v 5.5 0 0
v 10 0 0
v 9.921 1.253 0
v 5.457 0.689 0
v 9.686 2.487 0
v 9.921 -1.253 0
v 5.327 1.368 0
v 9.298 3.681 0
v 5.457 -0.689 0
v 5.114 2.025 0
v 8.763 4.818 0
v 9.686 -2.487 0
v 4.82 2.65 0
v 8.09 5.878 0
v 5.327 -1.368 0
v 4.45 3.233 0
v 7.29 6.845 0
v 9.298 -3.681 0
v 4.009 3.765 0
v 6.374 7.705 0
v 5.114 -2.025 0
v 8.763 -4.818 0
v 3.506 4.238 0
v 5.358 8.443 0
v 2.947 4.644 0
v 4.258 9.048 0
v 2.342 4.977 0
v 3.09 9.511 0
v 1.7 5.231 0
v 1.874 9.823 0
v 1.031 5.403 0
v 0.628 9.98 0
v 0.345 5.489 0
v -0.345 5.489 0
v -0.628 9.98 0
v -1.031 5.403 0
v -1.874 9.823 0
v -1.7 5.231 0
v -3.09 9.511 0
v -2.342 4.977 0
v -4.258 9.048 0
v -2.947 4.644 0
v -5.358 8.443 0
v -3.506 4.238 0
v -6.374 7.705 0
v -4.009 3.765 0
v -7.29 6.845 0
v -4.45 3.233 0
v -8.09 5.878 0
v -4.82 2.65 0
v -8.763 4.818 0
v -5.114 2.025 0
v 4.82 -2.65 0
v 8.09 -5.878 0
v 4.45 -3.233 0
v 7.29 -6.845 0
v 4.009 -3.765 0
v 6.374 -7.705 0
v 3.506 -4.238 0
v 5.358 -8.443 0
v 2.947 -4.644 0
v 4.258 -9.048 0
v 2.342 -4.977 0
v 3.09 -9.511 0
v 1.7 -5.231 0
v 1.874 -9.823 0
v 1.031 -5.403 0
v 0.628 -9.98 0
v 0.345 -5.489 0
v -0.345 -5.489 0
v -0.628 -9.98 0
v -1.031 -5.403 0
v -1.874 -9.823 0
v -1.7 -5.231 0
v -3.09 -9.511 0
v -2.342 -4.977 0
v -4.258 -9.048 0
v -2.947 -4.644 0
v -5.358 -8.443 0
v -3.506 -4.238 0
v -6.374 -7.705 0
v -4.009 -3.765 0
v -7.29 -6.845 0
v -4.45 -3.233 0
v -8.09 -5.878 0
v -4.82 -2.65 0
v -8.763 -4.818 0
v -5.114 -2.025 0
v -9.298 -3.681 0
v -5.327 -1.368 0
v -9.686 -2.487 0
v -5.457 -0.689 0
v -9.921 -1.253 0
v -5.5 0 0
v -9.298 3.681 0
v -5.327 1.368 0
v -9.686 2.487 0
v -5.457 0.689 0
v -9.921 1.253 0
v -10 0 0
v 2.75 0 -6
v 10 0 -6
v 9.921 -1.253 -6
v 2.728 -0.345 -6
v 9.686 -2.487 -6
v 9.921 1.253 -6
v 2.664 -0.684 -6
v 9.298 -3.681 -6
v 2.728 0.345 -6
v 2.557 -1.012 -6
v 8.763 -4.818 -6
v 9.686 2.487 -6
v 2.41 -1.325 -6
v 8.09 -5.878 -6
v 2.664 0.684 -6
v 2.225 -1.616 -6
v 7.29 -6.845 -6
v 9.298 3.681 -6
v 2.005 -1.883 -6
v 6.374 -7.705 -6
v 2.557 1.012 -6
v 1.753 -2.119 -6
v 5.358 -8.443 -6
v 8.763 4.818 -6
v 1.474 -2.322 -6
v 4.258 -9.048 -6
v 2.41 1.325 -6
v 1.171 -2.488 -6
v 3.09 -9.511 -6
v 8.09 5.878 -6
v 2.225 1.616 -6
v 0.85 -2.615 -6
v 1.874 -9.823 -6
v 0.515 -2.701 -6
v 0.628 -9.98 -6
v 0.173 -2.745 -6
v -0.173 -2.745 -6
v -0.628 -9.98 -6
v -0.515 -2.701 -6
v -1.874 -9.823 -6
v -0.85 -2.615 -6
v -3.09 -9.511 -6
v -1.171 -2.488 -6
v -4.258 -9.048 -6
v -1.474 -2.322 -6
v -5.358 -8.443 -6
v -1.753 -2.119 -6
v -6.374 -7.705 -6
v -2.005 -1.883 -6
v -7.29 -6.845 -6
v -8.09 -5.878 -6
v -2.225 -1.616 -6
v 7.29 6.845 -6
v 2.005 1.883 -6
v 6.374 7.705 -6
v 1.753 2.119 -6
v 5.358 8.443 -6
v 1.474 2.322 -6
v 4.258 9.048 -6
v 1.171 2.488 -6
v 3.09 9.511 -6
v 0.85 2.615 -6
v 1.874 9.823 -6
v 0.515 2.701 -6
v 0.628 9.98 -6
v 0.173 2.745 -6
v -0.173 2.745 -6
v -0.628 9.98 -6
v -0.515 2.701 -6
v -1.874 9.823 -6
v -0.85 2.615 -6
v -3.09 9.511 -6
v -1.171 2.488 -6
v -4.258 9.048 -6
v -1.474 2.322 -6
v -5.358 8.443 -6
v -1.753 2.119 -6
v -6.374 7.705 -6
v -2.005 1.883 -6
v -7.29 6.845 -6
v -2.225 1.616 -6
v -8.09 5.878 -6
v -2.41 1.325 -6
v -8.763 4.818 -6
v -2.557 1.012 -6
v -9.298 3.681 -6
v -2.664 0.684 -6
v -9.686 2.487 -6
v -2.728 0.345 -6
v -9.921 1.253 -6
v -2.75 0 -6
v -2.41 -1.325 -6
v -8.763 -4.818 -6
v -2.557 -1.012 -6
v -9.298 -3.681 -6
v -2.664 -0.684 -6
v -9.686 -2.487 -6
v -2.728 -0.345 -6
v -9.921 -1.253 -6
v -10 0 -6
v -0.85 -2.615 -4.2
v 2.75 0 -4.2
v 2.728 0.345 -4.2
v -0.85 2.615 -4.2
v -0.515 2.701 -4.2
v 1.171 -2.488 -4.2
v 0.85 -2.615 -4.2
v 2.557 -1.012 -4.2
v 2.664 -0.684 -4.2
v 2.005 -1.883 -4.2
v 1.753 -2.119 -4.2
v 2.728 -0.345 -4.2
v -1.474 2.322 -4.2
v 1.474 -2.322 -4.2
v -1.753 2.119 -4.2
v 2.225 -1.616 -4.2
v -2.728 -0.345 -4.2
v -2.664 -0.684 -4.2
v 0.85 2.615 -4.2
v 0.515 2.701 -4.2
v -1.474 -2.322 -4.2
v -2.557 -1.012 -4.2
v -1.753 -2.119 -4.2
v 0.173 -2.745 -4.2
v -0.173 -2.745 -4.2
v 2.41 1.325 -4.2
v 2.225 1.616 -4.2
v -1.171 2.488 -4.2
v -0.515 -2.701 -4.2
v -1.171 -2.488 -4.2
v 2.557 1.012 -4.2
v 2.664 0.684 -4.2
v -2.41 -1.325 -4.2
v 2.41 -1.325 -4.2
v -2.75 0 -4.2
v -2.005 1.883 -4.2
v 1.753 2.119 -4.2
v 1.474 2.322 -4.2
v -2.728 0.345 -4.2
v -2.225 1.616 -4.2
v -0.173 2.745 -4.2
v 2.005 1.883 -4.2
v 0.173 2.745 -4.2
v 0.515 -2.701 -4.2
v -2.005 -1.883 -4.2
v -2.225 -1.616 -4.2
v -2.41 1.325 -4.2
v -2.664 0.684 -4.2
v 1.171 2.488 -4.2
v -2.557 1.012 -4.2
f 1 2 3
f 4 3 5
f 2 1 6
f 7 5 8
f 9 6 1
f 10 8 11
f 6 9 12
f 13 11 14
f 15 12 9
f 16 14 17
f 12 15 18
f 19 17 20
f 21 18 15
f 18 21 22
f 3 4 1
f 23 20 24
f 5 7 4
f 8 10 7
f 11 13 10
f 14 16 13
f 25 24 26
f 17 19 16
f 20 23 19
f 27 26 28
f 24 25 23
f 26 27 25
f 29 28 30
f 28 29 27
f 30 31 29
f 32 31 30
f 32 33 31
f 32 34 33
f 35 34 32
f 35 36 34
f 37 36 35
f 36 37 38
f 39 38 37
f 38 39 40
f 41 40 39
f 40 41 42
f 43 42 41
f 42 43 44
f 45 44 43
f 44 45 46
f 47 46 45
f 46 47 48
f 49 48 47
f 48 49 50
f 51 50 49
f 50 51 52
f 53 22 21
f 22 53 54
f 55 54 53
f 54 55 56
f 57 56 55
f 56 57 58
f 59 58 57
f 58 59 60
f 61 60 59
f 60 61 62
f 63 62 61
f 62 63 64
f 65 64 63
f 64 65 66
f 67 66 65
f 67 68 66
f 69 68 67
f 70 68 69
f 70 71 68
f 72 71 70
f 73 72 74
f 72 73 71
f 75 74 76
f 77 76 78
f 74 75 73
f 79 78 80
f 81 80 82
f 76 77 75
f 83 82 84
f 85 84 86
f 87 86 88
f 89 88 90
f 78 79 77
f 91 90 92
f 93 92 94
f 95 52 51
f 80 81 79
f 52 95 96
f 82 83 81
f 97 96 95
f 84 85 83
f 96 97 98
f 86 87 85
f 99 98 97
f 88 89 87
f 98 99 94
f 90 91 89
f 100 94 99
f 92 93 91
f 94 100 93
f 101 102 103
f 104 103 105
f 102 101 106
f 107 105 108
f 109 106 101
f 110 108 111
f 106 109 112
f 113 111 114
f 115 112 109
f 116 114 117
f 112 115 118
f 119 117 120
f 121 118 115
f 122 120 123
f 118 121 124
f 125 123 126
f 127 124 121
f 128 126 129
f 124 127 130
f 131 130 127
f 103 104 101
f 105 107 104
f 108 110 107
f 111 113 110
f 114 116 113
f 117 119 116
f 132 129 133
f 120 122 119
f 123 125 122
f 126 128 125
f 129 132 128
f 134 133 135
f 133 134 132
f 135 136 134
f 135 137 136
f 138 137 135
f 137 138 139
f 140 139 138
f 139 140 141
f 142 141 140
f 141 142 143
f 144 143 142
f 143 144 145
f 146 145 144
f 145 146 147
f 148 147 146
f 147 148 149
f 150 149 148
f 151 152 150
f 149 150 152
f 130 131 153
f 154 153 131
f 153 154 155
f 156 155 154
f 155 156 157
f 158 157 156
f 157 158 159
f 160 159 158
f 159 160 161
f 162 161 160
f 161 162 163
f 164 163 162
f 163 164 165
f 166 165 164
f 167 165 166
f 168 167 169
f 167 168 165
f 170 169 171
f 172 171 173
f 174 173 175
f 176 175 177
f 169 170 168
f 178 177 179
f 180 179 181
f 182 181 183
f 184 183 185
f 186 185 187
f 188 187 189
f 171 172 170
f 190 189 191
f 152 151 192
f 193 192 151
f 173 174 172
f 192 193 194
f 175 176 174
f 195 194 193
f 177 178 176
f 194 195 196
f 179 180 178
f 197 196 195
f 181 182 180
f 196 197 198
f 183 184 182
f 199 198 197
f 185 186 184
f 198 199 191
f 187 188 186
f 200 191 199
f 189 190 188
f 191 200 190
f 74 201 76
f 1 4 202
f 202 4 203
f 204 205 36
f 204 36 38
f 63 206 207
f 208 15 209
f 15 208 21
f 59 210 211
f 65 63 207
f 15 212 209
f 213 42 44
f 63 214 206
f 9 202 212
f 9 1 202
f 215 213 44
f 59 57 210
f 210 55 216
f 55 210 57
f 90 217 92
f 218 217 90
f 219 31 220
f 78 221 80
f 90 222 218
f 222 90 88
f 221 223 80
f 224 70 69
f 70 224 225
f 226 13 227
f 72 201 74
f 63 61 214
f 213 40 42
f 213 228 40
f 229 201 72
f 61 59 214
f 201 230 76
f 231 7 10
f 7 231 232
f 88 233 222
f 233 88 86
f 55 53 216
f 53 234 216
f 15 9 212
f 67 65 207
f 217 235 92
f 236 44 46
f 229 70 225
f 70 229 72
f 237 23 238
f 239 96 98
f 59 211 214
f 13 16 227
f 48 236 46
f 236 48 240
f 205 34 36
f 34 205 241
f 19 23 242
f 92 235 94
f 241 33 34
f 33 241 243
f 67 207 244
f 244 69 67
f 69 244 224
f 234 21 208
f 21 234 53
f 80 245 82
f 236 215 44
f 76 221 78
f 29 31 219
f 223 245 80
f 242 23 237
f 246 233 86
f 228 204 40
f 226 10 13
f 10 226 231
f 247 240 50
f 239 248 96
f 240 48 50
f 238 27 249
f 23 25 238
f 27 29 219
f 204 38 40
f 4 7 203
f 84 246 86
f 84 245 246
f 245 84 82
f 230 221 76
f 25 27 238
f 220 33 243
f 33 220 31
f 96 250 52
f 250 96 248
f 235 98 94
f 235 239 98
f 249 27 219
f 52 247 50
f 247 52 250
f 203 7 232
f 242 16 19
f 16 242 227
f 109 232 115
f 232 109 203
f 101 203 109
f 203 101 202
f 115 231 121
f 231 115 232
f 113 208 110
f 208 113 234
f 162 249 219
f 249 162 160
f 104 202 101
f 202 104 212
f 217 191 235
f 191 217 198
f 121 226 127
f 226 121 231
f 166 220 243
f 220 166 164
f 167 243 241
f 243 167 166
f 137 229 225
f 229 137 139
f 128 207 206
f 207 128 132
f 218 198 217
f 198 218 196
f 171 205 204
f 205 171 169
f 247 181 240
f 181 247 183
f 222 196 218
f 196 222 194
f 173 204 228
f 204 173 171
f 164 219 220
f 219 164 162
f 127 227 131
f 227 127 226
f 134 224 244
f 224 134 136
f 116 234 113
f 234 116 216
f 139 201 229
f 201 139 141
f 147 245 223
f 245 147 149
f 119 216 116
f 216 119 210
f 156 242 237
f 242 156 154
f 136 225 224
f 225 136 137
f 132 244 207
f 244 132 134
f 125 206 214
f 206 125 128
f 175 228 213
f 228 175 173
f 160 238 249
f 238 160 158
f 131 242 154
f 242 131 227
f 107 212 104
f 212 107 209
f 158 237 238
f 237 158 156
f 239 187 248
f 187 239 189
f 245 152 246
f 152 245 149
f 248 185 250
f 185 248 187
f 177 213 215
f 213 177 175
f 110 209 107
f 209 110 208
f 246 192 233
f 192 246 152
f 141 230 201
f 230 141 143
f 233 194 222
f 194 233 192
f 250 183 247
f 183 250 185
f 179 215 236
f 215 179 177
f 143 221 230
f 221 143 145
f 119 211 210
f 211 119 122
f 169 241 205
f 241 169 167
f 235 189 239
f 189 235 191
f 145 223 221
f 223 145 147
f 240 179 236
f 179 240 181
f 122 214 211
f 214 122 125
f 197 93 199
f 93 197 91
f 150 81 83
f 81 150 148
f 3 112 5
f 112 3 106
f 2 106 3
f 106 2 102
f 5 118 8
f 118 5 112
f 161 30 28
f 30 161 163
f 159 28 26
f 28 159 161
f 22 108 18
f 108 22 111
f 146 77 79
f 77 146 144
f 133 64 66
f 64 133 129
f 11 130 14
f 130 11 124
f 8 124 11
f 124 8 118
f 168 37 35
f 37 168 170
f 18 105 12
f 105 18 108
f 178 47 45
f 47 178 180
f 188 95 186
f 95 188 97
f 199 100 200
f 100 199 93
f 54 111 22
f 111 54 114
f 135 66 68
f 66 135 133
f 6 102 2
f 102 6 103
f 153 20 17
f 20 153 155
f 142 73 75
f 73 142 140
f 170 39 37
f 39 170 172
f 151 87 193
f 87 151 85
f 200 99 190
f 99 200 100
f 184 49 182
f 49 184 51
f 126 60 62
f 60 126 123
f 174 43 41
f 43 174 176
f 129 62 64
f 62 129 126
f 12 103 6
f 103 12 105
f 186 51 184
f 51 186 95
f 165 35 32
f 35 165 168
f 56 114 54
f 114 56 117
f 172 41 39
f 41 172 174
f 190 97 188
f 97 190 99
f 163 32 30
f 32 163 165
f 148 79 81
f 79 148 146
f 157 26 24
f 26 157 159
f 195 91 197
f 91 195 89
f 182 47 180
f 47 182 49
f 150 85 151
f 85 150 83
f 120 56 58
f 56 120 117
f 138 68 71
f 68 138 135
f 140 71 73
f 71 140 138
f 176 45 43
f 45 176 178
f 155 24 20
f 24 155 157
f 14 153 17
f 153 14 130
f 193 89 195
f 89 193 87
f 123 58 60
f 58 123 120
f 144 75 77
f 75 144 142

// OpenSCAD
$fn = 50;


difference() {
	union() {
		translate(v = [0, 0, -6.0000000000]) {
			cylinder(h = 6, r = 10.0000000000);
		}
		cylinder(h = 0, r = 20.0000000000);
	}
	union() {
		translate(v = [0, 0, 0]) {
			rotate(a = [0, 0, 0]) {
				difference() {
					union() {
						#translate(v = [0, 0, -6.0000000000]) {
							cylinder(h = 6, r = 2.2500000000);
						}
						#translate(v = [0, 0, -4.2000000000]) {
							cylinder(h = 4.2000000000, r = 10.0000000000, r1 = 2.7500000000, r2 = 5.5000000000);
						}
						#translate(v = [0, 0, -6.0000000000]) {
							cylinder(h = 6, r = 2.7500000000);
						}
						#translate(v = [0, 0, -6.0000000000]) {
							cylinder(h = 6, r = 2.2500000000);
						}
					}
					union();
				}
			}
		}
	}
}
